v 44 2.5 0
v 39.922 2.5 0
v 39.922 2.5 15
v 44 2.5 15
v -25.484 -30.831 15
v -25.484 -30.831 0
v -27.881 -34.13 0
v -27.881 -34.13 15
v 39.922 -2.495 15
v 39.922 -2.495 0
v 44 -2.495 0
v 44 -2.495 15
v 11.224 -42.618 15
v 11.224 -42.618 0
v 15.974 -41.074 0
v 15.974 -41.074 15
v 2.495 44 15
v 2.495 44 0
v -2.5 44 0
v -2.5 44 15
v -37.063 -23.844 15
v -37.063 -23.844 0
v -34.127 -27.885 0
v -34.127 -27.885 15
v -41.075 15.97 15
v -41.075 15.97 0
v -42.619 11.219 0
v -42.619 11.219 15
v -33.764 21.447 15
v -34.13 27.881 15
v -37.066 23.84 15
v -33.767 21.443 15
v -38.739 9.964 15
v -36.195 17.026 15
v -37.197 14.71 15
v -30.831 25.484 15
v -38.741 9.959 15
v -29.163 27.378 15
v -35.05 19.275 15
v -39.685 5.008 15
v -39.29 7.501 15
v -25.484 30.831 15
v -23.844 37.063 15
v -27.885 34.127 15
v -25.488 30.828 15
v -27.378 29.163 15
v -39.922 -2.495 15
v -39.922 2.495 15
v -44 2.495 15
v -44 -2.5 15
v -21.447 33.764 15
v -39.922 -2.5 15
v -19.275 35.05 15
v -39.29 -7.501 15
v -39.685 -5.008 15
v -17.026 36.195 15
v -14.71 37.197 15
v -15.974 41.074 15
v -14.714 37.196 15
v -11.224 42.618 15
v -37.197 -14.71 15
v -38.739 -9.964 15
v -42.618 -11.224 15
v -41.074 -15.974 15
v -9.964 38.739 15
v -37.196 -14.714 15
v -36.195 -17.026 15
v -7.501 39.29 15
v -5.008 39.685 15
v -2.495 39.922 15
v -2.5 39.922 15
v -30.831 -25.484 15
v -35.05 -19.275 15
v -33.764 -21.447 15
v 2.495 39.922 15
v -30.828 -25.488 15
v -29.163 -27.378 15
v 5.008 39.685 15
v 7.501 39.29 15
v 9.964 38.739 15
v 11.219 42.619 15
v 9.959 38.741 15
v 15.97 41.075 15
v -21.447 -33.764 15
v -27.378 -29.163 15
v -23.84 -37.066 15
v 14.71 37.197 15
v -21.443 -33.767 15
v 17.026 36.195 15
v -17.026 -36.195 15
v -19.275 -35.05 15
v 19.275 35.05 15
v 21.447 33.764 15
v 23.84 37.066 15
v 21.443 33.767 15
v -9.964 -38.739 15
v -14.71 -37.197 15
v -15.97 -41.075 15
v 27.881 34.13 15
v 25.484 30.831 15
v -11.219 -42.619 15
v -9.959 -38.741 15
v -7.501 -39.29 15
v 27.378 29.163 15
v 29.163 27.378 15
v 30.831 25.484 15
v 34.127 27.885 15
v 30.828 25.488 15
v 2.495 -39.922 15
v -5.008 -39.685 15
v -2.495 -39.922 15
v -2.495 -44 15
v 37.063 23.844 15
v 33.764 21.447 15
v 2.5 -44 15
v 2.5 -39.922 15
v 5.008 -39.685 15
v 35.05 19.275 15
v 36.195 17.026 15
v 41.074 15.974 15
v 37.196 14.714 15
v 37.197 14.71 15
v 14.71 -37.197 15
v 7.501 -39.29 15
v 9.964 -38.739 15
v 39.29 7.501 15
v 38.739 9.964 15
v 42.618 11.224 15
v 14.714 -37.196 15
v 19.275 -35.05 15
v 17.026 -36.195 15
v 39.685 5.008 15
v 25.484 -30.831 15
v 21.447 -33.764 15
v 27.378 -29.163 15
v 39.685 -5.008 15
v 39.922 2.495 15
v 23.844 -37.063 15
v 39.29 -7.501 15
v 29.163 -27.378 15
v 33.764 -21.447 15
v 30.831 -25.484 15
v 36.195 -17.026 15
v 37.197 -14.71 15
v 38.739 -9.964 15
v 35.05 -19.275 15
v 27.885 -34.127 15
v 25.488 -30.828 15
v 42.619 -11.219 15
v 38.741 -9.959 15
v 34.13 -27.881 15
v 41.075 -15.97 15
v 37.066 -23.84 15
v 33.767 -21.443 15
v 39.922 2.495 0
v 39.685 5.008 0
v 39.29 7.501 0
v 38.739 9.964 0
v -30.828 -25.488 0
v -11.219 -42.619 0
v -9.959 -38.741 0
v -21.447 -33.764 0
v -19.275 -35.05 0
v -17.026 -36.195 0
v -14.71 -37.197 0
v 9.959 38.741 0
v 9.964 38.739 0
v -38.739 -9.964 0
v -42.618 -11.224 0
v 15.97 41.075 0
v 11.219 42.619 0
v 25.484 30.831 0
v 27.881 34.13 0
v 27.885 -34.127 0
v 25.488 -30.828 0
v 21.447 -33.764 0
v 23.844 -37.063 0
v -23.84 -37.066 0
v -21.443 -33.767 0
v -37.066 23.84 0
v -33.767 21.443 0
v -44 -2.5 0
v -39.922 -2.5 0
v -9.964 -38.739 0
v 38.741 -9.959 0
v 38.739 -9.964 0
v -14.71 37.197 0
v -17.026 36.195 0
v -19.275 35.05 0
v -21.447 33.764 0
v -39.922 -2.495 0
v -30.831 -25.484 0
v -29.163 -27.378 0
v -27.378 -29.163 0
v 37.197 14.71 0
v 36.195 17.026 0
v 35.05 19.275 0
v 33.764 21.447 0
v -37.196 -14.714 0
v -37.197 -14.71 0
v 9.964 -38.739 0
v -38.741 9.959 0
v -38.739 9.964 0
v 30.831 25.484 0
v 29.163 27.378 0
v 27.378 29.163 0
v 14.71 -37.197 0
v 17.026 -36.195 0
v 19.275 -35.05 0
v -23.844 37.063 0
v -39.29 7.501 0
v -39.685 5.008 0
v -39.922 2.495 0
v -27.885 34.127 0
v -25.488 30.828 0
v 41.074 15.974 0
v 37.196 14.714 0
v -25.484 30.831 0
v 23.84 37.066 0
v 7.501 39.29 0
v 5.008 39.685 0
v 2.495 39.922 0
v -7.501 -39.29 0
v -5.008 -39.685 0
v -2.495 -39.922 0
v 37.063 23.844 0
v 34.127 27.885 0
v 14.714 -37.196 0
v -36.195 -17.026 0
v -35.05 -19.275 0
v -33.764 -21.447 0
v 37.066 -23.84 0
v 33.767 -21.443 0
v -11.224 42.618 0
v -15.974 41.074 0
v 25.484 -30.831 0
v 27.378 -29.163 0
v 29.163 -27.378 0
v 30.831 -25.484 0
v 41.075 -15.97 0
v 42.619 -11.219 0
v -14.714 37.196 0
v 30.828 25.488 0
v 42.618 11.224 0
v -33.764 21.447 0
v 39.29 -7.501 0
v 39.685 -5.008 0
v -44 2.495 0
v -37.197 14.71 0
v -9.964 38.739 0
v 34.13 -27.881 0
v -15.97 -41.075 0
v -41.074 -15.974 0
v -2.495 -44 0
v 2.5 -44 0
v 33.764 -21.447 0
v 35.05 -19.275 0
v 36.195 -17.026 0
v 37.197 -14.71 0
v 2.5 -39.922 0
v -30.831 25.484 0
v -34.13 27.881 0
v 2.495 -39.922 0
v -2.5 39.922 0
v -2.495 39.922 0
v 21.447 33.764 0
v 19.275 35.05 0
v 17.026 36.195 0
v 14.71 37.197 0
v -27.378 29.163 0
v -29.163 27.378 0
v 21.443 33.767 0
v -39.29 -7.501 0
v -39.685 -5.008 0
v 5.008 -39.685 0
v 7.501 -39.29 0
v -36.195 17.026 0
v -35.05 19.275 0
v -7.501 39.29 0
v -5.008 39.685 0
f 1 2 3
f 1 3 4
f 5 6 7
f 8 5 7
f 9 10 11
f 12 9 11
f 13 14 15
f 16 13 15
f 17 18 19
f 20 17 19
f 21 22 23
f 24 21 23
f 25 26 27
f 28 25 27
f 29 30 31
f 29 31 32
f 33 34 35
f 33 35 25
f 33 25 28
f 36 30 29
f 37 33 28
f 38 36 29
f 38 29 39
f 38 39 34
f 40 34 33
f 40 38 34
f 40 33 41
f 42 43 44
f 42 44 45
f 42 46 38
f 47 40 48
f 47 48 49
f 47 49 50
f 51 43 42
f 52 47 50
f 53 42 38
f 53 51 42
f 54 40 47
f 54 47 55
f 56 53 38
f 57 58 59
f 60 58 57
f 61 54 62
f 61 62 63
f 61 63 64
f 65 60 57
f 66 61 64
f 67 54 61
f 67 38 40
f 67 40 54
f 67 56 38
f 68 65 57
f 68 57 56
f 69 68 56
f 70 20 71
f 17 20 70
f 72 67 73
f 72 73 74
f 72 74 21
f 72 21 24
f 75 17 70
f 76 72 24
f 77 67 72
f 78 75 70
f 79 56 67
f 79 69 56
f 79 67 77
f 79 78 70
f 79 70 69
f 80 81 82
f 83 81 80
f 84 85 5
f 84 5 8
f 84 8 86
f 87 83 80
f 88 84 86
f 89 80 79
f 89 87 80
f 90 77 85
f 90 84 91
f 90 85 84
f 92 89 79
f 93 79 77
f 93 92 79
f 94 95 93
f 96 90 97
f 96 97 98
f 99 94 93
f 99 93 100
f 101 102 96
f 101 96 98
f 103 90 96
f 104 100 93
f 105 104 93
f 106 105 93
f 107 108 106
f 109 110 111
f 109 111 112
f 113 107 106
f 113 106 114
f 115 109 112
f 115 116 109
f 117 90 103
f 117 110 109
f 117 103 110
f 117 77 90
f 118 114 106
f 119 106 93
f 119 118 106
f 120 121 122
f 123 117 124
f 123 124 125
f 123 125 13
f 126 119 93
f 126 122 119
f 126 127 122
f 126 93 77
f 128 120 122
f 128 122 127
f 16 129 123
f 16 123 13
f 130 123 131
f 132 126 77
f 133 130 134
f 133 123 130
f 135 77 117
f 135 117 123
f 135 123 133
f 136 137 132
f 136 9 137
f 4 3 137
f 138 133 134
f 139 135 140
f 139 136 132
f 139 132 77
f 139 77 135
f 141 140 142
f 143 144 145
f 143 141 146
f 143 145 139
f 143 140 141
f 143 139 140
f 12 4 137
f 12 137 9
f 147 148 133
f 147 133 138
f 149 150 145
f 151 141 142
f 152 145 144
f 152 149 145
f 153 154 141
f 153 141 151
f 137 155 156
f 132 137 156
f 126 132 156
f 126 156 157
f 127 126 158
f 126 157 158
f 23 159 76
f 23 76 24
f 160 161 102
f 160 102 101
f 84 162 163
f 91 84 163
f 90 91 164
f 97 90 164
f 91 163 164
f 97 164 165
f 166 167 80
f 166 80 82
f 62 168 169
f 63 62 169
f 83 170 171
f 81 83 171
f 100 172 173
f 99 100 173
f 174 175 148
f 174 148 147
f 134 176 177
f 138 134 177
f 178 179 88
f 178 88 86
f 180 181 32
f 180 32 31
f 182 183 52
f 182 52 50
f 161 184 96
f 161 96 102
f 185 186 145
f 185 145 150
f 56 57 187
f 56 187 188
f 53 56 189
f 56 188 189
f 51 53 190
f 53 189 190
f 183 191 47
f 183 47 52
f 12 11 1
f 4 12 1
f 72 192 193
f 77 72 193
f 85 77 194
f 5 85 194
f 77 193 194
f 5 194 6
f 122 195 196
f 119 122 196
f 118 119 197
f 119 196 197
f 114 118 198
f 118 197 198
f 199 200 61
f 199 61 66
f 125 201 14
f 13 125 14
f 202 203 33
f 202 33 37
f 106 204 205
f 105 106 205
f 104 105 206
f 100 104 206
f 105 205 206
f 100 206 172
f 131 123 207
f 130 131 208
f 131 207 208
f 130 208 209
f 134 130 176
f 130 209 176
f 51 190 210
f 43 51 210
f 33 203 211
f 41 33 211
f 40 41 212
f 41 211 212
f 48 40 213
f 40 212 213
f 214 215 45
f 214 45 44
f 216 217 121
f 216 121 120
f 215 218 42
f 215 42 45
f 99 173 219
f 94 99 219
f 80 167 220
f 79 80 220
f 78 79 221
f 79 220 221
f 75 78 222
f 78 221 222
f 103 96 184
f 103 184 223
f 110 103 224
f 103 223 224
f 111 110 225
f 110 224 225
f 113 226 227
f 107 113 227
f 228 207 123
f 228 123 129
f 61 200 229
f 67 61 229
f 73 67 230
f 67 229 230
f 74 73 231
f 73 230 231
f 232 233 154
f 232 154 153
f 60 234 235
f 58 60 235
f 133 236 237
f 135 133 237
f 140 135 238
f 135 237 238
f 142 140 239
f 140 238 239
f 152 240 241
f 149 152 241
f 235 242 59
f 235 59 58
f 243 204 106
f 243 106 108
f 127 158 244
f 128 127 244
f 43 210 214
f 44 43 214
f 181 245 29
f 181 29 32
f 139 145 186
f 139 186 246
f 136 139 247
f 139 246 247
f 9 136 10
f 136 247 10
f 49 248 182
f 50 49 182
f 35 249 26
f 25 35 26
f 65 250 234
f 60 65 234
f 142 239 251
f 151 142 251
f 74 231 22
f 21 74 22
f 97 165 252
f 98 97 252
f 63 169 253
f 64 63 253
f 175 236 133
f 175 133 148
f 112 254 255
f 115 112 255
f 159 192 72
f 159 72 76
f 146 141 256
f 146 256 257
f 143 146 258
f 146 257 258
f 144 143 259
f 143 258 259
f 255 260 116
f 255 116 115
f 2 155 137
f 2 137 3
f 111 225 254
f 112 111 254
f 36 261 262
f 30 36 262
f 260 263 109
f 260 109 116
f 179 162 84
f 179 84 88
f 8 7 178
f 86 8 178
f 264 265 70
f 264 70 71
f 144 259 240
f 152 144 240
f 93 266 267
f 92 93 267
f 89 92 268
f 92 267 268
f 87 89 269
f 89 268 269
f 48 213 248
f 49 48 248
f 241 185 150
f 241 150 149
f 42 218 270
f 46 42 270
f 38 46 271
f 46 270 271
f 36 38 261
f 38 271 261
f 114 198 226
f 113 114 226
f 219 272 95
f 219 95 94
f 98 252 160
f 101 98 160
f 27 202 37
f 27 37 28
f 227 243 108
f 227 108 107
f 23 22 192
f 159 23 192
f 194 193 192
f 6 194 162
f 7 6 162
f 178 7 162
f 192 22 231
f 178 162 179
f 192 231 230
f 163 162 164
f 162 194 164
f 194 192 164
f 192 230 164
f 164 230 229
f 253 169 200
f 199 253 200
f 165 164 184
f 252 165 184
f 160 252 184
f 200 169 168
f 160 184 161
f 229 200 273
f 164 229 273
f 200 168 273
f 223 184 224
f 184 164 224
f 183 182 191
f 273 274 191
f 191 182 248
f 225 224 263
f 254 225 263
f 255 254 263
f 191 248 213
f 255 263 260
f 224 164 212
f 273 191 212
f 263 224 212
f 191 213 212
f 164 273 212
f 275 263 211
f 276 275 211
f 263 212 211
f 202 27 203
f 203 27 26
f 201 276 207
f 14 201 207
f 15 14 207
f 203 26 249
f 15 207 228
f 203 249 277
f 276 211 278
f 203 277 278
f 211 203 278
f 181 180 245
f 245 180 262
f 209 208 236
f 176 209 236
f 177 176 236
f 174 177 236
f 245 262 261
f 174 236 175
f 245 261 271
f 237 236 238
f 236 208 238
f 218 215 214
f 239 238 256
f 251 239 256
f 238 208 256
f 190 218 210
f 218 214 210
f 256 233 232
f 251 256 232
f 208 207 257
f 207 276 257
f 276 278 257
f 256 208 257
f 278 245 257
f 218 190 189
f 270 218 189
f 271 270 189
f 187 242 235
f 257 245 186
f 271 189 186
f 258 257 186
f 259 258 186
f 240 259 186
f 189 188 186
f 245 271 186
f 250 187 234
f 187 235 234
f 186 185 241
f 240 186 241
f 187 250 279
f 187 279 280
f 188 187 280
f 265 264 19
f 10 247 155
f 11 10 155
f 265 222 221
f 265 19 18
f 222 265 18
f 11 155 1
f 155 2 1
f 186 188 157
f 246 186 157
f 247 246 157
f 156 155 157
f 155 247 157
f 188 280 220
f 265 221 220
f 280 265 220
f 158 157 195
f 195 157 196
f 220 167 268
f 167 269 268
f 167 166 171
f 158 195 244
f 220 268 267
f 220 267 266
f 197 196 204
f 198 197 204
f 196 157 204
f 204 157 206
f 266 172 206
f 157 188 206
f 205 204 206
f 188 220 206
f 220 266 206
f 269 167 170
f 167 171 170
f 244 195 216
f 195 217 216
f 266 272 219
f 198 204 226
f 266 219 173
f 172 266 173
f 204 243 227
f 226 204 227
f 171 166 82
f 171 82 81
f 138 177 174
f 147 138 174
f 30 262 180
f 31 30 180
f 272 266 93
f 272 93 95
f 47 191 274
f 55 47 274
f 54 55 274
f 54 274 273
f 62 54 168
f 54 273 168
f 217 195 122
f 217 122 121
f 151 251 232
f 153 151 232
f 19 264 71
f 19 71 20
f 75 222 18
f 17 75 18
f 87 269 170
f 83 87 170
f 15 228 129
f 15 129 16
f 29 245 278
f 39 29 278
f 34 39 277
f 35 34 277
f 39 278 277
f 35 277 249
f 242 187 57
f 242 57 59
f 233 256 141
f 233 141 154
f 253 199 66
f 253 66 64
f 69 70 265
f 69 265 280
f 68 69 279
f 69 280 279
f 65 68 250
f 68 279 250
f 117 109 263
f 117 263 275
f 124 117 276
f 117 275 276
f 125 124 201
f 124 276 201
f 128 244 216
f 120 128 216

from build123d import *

# Parameters (mm, degrees)
SKETCH_1_R               = 40
EXTRUDE_1_DEPTH          = 15
SKETCH_2_W               = 4.077896861
SKETCH_2_H               = 4.995131446
EXTRUDE_2_DEPTH          = 15
PATTERN_CIRCULAR_1_COUNT = 20


with BuildPart() as part:
    # 草图1 → 凸台-拉伸1 (new body)
    with BuildSketch(Plane.XY):
        Circle(SKETCH_1_R)
    extrude(amount=EXTRUDE_1_DEPTH)

    # 草图2 → 凸台-拉伸2 (add)
    with BuildSketch(Plane.XY):
        with Locations((41.96105157, 0.002434277)):
            Rectangle(SKETCH_2_W, SKETCH_2_H)
    extrude_2 = extrude(amount=EXTRUDE_2_DEPTH)

    # 阵列(圆周)1: 凸台-拉伸2 ×20 about axis
    pattern_circular_1_axis = Axis((0, 0, 15), (0, 0, -1))
    for i in range(1, PATTERN_CIRCULAR_1_COUNT):
        add(extrude_2.rotate(pattern_circular_1_axis, i * 360 / PATTERN_CIRCULAR_1_COUNT))


solid = part.part
